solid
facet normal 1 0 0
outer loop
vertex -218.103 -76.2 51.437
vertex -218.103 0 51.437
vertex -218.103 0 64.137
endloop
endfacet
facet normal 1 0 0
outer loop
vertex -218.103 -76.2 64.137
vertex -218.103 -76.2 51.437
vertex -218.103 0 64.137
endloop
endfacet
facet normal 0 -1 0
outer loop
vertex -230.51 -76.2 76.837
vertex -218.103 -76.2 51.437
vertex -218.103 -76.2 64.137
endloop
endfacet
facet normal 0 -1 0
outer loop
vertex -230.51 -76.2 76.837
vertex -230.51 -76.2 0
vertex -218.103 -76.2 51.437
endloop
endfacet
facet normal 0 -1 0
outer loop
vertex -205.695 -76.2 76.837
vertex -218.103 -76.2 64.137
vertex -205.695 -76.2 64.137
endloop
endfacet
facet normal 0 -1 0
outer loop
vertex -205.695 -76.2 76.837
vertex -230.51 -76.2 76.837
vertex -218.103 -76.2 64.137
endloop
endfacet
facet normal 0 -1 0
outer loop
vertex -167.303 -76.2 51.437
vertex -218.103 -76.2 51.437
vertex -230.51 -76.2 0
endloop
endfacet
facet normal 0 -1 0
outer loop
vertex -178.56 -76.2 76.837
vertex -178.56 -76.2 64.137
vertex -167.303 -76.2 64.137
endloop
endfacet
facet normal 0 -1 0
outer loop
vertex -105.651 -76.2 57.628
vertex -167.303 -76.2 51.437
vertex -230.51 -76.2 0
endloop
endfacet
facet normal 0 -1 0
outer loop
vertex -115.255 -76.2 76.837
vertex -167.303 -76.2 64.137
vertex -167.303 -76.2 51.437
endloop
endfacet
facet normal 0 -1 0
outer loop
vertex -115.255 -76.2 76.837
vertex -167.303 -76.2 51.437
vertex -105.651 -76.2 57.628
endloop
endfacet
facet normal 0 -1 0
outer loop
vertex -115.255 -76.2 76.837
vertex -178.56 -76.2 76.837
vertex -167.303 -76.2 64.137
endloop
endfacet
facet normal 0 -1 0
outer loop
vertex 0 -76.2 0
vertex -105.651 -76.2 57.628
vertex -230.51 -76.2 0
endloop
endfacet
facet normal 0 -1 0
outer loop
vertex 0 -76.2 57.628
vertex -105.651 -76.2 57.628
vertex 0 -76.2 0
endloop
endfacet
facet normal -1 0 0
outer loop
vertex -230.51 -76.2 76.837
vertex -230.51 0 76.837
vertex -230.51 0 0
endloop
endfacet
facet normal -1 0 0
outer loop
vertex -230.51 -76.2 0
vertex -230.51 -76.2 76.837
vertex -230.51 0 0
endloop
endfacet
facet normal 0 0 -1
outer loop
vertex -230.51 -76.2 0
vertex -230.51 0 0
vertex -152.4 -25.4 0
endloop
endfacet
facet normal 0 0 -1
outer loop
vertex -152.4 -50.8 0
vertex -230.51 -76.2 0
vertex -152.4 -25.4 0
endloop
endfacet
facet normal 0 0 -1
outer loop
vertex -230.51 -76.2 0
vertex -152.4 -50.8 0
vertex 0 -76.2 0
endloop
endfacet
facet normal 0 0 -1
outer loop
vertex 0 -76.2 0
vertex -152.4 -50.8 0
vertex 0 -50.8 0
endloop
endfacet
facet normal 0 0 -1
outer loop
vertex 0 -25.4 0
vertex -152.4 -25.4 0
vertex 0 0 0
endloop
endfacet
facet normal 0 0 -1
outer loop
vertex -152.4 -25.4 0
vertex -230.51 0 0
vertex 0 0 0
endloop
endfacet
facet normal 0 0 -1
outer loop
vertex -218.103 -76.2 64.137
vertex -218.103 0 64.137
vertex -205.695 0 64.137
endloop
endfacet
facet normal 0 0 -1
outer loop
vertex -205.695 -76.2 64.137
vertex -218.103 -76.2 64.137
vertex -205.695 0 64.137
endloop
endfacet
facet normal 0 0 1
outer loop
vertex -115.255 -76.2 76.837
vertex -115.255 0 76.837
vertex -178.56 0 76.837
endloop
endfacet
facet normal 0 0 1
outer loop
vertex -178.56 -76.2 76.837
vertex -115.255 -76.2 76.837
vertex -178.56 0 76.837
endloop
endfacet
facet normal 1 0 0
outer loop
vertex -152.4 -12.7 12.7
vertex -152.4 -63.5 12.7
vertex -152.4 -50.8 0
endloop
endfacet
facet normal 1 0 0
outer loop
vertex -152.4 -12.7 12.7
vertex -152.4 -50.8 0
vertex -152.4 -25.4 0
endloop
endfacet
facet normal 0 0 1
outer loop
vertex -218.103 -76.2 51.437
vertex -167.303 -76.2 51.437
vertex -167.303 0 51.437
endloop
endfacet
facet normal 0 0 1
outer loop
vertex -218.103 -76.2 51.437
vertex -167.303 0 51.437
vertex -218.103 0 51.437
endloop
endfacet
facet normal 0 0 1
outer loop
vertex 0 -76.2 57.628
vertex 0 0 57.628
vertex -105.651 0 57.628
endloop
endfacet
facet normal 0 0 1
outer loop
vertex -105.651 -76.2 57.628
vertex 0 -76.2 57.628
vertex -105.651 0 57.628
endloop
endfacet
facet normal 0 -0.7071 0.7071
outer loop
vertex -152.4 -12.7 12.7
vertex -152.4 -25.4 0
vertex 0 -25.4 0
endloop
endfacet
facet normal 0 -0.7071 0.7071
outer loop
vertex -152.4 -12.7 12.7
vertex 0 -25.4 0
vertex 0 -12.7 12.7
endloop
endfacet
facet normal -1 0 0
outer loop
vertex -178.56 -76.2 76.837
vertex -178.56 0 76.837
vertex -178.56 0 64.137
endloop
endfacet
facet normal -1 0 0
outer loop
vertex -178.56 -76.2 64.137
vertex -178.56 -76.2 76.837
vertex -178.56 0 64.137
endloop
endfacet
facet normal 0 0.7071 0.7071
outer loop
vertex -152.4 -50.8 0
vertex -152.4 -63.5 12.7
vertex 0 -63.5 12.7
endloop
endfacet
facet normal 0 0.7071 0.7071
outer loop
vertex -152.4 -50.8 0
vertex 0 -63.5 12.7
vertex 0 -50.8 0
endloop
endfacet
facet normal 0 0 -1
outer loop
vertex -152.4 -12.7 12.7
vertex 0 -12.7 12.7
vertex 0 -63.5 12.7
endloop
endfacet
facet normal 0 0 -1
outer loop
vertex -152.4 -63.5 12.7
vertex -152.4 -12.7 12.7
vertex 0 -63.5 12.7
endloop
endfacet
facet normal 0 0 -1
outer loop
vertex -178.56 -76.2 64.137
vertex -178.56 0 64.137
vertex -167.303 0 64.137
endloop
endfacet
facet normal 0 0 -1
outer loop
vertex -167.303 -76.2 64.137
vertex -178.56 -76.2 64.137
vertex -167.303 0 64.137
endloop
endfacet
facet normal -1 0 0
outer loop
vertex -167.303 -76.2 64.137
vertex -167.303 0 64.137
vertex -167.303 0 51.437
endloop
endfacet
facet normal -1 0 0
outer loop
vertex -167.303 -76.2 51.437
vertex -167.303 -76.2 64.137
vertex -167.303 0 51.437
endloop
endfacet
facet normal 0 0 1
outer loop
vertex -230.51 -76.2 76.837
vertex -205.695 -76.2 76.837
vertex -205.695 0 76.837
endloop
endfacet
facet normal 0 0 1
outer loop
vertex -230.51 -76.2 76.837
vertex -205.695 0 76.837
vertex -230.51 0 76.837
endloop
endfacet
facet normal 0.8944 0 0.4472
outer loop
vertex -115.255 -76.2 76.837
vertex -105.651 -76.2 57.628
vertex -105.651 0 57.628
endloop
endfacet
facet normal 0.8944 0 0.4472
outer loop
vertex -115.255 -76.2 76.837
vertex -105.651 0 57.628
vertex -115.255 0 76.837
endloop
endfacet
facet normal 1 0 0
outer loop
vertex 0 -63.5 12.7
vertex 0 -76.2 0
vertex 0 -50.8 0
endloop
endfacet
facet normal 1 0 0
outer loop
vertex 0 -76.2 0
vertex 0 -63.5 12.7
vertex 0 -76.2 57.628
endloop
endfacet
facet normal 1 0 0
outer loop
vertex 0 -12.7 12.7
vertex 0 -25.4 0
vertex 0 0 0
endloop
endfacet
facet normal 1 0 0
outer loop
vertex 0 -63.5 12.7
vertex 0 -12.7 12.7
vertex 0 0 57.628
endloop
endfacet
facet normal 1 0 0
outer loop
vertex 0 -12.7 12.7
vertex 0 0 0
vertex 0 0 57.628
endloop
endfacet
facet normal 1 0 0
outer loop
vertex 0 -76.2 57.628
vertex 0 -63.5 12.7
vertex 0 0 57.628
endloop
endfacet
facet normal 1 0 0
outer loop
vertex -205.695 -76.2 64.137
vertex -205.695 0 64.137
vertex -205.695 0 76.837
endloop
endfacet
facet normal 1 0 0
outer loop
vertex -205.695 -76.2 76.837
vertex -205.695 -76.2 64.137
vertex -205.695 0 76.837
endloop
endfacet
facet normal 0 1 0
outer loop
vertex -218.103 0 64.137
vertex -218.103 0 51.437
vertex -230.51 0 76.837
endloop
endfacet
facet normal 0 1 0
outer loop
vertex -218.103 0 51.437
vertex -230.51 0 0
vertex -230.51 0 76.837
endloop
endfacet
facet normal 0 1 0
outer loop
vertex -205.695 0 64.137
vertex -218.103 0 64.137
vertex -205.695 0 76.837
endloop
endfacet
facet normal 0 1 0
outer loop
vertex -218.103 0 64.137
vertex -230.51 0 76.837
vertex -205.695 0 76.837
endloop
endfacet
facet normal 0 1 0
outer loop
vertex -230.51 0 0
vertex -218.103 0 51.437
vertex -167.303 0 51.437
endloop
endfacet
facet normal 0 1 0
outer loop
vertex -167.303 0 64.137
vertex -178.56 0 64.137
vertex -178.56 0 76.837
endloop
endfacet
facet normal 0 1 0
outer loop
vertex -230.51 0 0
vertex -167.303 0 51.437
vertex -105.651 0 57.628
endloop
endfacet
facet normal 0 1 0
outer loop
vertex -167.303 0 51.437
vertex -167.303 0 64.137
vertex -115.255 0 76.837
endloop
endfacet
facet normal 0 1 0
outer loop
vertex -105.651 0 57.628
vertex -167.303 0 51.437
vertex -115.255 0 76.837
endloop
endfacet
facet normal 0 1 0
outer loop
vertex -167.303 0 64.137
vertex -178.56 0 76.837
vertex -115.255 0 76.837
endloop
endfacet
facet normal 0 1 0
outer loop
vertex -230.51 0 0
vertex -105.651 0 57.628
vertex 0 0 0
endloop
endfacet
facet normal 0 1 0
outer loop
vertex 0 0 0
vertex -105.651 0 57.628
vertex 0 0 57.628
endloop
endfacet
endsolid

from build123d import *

# Parameters (mm, degrees)
F1_DEPTH = 76.2
F3_DEPTH = 152.4


with BuildPart() as f1:
    # F0 (on Front) → F1 (new body)
    with BuildSketch(Plane.XZ):
        Polygon((-230.51038, 0), (0, 0), (0, 57.627595), (-105.650591, 57.627595), (-115.25519, 76.836793), (-178.560193, 76.836793), (-178.560193, 64.136793), (-167.302838, 64.136793), (-167.302838, 51.436793), (-218.102838, 51.436793), (-218.102838, 64.136793), (-205.695296, 64.136793), (-205.695296, 76.836793), (-230.51038, 76.836793), align=None)
    extrude(amount=F1_DEPTH)

    # F2 (on face) → F3 (cut)
    with BuildSketch(Plane.YZ):
        Polygon((-12.7, 12.7), (-38.1, 12.7), (-63.5, 12.7), (-50.8, 0), (-25.4, 0), align=None)
    extrude(amount=-F3_DEPTH, mode=Mode.SUBTRACT)


solid = f1.part
